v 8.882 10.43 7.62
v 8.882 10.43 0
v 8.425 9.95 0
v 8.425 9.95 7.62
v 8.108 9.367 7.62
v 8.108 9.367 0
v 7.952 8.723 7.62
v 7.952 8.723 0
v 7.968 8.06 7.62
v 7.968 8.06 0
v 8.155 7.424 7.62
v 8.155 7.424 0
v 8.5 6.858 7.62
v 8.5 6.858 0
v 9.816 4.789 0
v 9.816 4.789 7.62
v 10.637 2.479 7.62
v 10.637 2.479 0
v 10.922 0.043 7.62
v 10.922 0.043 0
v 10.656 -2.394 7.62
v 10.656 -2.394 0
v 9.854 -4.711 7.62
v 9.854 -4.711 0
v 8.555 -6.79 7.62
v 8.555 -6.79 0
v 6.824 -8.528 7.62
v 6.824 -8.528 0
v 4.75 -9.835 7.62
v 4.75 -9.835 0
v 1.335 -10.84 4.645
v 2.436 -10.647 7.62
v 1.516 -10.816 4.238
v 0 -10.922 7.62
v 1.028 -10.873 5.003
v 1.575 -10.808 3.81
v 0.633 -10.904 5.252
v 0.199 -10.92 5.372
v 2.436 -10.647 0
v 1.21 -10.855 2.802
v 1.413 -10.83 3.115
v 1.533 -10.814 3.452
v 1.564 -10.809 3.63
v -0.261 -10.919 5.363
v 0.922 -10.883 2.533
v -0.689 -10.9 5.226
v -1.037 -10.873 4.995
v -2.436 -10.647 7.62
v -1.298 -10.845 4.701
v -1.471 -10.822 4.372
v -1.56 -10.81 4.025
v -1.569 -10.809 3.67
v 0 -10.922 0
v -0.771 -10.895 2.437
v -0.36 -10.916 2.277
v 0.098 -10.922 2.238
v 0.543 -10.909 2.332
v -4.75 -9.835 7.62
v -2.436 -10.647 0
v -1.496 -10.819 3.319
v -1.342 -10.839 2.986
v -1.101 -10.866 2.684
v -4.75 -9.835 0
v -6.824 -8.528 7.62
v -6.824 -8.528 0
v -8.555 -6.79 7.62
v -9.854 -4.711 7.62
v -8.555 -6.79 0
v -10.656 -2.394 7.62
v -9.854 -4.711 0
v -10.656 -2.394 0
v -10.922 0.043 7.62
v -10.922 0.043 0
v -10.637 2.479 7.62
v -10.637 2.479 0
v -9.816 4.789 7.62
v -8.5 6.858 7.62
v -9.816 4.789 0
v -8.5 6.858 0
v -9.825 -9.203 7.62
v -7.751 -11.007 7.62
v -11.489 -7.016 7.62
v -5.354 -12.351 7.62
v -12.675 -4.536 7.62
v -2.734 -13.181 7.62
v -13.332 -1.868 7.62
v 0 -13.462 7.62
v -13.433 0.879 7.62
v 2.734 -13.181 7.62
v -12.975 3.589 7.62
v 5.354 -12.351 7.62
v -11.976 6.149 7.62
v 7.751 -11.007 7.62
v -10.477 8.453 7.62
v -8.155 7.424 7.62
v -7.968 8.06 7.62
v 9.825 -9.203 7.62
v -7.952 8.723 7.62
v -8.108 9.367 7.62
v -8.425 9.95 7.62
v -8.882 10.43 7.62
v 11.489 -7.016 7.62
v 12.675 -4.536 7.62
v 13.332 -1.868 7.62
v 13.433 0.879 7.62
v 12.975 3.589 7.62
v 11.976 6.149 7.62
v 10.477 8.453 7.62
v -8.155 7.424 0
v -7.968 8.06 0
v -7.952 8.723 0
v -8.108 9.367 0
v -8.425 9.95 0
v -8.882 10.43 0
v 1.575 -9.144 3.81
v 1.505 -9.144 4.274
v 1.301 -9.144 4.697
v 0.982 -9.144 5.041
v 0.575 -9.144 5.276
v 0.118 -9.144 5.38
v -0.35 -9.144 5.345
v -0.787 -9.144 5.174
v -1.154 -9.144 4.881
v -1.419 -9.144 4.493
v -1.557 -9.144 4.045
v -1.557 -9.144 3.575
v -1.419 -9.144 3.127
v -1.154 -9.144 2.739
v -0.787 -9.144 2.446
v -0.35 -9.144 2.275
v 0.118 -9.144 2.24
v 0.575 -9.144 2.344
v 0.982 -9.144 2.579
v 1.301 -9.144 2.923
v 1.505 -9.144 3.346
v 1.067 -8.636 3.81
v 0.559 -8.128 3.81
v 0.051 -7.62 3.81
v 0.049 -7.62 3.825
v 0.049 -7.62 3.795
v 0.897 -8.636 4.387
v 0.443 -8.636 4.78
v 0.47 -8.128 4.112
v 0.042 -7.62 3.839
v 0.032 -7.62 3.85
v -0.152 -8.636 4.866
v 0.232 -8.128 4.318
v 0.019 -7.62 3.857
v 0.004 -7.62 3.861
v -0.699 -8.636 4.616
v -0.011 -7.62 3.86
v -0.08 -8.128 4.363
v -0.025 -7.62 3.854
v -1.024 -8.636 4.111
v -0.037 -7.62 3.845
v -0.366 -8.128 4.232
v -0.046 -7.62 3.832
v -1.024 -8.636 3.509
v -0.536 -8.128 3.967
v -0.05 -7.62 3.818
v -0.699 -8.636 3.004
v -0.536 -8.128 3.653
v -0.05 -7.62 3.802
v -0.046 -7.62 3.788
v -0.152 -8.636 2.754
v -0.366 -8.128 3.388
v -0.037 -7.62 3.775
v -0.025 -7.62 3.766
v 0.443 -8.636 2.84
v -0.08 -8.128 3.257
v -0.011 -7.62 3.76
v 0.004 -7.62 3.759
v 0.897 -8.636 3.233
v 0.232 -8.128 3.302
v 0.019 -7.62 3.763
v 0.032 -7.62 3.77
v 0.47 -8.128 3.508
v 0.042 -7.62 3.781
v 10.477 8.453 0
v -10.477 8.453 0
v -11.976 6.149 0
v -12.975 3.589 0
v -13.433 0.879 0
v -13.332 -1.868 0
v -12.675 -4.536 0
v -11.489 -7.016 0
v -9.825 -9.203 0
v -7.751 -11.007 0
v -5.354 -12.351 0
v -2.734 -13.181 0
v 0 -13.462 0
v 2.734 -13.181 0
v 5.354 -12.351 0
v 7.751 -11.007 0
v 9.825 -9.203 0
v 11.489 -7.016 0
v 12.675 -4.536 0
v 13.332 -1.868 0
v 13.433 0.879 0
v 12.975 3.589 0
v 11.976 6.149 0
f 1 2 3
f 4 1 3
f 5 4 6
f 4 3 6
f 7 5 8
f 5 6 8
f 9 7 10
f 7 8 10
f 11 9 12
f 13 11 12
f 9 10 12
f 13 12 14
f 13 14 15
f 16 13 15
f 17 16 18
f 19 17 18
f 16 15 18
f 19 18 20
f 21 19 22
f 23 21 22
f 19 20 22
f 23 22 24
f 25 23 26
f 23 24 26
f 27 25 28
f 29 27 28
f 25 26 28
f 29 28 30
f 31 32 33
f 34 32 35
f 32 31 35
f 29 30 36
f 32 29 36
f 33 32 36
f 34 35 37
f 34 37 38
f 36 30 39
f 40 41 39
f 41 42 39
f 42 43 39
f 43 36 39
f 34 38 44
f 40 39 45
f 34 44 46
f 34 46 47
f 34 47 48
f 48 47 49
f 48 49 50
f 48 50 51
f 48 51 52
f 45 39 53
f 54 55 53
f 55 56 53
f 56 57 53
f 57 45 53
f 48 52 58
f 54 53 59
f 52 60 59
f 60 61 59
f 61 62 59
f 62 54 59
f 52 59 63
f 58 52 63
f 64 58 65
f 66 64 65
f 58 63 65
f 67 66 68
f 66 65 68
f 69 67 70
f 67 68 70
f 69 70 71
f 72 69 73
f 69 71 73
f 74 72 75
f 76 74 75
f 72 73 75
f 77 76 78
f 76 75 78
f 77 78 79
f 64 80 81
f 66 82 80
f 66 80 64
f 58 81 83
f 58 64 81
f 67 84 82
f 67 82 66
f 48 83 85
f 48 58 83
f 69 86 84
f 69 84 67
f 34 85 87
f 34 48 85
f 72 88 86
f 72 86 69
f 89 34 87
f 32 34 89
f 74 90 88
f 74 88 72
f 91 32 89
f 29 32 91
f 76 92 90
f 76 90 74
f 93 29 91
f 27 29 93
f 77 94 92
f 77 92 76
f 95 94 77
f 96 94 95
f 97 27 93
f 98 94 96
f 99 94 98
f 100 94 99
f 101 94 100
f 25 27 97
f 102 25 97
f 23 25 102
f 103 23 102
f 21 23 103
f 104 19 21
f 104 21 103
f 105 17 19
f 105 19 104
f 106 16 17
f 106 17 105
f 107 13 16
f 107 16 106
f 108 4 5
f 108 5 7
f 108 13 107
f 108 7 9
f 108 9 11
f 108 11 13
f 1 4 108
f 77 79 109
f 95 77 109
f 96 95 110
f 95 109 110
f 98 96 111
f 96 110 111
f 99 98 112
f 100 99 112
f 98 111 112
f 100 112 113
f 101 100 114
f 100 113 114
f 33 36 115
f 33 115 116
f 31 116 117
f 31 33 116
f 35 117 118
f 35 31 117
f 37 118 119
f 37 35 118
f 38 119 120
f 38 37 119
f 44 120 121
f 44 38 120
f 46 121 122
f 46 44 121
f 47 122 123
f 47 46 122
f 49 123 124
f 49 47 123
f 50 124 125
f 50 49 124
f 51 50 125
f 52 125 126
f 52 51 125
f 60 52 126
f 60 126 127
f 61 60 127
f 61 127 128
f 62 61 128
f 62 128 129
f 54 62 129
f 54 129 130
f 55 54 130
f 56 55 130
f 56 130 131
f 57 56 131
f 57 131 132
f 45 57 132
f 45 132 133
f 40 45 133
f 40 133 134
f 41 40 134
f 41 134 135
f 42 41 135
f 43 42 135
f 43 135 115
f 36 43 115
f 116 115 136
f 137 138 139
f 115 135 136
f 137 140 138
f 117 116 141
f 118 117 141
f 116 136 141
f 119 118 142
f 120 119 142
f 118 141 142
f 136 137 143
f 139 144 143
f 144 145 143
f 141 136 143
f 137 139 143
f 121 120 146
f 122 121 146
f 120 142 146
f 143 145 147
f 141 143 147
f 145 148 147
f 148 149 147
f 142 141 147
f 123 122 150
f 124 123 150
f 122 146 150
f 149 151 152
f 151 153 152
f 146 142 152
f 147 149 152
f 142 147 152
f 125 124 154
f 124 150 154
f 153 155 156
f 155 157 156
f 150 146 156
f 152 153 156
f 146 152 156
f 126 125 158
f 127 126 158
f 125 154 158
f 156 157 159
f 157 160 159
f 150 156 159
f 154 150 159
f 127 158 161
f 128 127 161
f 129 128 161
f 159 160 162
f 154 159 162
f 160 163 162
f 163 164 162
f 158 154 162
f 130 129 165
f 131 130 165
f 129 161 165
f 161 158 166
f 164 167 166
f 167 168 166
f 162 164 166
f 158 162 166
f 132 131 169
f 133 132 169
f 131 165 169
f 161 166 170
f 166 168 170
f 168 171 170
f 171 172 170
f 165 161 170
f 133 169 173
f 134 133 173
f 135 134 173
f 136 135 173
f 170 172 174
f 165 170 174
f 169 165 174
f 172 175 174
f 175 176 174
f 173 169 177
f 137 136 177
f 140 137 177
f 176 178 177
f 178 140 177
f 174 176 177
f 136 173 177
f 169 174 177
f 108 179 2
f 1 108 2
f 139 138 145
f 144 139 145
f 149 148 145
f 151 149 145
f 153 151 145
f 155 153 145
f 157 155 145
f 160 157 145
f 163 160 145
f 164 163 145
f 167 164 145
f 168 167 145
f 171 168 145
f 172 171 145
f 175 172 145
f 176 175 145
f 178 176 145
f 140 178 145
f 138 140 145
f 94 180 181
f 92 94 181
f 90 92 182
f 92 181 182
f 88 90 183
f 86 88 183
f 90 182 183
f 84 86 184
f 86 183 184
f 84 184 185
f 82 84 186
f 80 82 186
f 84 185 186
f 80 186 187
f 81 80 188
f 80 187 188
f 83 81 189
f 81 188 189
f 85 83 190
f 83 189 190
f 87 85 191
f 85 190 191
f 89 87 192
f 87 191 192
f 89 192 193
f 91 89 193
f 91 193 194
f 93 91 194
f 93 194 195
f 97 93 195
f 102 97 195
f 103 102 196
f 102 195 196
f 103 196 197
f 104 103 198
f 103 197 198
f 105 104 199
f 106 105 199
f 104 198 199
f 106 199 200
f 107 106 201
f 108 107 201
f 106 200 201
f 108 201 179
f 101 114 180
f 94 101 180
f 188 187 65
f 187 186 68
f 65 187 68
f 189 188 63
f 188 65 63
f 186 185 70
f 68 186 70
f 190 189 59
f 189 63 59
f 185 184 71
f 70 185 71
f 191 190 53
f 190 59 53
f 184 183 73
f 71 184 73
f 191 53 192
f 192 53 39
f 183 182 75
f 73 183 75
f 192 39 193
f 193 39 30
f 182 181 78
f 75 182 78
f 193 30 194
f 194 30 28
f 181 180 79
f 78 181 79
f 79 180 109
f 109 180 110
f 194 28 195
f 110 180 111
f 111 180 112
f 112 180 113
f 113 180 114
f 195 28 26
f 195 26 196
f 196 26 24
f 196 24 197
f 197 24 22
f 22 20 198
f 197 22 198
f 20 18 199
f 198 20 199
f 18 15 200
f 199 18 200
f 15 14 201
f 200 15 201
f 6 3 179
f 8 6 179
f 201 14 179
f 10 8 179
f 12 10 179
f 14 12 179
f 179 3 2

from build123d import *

# Parameters (mm, degrees)
F1_DEPTH = 7.62
F3_R     = 1.5748
F4_DEPTH = 3.81
F5_SIZE  = 1.524


with BuildPart() as f1:
    # F0 (on Top) → F1 (new body)
    with BuildSketch(Plane.XY):
        with BuildLine():
            ThreePointArc((8.500466, 6.858), (0, -10.922), (-8.500466, 6.858))
            ThreePointArc((-8.500466, 6.858), (-7.951719, 8.722976), (-8.882435, 10.429736))
            Line((-8.882435, 10.429736), (-10.477318, 8.452884))
            ThreePointArc((-10.477318, 8.452884), (0, -13.462), (10.477318, 8.452884))
            Line((10.477318, 8.452884), (8.882435, 10.429736))
            ThreePointArc((8.882435, 10.429736), (7.951719, 8.722976), (8.500466, 6.858))
        make_face()
    extrude(amount=F1_DEPTH)

    # F3 (on offset) → F4 (join)
    with BuildSketch(Plane.XZ.offset(11.43)):
        with Locations((0, 3.81)):
            Circle(F3_R)
    extrude(amount=-F4_DEPTH)

    # F5
    f5_edges = [f1.edges().sort_by_distance(p)[0] for p in [
        (-1.5748, -7.62, 3.81),
    ]]
    chamfer(f5_edges, length=F5_SIZE)


solid = f1.part
